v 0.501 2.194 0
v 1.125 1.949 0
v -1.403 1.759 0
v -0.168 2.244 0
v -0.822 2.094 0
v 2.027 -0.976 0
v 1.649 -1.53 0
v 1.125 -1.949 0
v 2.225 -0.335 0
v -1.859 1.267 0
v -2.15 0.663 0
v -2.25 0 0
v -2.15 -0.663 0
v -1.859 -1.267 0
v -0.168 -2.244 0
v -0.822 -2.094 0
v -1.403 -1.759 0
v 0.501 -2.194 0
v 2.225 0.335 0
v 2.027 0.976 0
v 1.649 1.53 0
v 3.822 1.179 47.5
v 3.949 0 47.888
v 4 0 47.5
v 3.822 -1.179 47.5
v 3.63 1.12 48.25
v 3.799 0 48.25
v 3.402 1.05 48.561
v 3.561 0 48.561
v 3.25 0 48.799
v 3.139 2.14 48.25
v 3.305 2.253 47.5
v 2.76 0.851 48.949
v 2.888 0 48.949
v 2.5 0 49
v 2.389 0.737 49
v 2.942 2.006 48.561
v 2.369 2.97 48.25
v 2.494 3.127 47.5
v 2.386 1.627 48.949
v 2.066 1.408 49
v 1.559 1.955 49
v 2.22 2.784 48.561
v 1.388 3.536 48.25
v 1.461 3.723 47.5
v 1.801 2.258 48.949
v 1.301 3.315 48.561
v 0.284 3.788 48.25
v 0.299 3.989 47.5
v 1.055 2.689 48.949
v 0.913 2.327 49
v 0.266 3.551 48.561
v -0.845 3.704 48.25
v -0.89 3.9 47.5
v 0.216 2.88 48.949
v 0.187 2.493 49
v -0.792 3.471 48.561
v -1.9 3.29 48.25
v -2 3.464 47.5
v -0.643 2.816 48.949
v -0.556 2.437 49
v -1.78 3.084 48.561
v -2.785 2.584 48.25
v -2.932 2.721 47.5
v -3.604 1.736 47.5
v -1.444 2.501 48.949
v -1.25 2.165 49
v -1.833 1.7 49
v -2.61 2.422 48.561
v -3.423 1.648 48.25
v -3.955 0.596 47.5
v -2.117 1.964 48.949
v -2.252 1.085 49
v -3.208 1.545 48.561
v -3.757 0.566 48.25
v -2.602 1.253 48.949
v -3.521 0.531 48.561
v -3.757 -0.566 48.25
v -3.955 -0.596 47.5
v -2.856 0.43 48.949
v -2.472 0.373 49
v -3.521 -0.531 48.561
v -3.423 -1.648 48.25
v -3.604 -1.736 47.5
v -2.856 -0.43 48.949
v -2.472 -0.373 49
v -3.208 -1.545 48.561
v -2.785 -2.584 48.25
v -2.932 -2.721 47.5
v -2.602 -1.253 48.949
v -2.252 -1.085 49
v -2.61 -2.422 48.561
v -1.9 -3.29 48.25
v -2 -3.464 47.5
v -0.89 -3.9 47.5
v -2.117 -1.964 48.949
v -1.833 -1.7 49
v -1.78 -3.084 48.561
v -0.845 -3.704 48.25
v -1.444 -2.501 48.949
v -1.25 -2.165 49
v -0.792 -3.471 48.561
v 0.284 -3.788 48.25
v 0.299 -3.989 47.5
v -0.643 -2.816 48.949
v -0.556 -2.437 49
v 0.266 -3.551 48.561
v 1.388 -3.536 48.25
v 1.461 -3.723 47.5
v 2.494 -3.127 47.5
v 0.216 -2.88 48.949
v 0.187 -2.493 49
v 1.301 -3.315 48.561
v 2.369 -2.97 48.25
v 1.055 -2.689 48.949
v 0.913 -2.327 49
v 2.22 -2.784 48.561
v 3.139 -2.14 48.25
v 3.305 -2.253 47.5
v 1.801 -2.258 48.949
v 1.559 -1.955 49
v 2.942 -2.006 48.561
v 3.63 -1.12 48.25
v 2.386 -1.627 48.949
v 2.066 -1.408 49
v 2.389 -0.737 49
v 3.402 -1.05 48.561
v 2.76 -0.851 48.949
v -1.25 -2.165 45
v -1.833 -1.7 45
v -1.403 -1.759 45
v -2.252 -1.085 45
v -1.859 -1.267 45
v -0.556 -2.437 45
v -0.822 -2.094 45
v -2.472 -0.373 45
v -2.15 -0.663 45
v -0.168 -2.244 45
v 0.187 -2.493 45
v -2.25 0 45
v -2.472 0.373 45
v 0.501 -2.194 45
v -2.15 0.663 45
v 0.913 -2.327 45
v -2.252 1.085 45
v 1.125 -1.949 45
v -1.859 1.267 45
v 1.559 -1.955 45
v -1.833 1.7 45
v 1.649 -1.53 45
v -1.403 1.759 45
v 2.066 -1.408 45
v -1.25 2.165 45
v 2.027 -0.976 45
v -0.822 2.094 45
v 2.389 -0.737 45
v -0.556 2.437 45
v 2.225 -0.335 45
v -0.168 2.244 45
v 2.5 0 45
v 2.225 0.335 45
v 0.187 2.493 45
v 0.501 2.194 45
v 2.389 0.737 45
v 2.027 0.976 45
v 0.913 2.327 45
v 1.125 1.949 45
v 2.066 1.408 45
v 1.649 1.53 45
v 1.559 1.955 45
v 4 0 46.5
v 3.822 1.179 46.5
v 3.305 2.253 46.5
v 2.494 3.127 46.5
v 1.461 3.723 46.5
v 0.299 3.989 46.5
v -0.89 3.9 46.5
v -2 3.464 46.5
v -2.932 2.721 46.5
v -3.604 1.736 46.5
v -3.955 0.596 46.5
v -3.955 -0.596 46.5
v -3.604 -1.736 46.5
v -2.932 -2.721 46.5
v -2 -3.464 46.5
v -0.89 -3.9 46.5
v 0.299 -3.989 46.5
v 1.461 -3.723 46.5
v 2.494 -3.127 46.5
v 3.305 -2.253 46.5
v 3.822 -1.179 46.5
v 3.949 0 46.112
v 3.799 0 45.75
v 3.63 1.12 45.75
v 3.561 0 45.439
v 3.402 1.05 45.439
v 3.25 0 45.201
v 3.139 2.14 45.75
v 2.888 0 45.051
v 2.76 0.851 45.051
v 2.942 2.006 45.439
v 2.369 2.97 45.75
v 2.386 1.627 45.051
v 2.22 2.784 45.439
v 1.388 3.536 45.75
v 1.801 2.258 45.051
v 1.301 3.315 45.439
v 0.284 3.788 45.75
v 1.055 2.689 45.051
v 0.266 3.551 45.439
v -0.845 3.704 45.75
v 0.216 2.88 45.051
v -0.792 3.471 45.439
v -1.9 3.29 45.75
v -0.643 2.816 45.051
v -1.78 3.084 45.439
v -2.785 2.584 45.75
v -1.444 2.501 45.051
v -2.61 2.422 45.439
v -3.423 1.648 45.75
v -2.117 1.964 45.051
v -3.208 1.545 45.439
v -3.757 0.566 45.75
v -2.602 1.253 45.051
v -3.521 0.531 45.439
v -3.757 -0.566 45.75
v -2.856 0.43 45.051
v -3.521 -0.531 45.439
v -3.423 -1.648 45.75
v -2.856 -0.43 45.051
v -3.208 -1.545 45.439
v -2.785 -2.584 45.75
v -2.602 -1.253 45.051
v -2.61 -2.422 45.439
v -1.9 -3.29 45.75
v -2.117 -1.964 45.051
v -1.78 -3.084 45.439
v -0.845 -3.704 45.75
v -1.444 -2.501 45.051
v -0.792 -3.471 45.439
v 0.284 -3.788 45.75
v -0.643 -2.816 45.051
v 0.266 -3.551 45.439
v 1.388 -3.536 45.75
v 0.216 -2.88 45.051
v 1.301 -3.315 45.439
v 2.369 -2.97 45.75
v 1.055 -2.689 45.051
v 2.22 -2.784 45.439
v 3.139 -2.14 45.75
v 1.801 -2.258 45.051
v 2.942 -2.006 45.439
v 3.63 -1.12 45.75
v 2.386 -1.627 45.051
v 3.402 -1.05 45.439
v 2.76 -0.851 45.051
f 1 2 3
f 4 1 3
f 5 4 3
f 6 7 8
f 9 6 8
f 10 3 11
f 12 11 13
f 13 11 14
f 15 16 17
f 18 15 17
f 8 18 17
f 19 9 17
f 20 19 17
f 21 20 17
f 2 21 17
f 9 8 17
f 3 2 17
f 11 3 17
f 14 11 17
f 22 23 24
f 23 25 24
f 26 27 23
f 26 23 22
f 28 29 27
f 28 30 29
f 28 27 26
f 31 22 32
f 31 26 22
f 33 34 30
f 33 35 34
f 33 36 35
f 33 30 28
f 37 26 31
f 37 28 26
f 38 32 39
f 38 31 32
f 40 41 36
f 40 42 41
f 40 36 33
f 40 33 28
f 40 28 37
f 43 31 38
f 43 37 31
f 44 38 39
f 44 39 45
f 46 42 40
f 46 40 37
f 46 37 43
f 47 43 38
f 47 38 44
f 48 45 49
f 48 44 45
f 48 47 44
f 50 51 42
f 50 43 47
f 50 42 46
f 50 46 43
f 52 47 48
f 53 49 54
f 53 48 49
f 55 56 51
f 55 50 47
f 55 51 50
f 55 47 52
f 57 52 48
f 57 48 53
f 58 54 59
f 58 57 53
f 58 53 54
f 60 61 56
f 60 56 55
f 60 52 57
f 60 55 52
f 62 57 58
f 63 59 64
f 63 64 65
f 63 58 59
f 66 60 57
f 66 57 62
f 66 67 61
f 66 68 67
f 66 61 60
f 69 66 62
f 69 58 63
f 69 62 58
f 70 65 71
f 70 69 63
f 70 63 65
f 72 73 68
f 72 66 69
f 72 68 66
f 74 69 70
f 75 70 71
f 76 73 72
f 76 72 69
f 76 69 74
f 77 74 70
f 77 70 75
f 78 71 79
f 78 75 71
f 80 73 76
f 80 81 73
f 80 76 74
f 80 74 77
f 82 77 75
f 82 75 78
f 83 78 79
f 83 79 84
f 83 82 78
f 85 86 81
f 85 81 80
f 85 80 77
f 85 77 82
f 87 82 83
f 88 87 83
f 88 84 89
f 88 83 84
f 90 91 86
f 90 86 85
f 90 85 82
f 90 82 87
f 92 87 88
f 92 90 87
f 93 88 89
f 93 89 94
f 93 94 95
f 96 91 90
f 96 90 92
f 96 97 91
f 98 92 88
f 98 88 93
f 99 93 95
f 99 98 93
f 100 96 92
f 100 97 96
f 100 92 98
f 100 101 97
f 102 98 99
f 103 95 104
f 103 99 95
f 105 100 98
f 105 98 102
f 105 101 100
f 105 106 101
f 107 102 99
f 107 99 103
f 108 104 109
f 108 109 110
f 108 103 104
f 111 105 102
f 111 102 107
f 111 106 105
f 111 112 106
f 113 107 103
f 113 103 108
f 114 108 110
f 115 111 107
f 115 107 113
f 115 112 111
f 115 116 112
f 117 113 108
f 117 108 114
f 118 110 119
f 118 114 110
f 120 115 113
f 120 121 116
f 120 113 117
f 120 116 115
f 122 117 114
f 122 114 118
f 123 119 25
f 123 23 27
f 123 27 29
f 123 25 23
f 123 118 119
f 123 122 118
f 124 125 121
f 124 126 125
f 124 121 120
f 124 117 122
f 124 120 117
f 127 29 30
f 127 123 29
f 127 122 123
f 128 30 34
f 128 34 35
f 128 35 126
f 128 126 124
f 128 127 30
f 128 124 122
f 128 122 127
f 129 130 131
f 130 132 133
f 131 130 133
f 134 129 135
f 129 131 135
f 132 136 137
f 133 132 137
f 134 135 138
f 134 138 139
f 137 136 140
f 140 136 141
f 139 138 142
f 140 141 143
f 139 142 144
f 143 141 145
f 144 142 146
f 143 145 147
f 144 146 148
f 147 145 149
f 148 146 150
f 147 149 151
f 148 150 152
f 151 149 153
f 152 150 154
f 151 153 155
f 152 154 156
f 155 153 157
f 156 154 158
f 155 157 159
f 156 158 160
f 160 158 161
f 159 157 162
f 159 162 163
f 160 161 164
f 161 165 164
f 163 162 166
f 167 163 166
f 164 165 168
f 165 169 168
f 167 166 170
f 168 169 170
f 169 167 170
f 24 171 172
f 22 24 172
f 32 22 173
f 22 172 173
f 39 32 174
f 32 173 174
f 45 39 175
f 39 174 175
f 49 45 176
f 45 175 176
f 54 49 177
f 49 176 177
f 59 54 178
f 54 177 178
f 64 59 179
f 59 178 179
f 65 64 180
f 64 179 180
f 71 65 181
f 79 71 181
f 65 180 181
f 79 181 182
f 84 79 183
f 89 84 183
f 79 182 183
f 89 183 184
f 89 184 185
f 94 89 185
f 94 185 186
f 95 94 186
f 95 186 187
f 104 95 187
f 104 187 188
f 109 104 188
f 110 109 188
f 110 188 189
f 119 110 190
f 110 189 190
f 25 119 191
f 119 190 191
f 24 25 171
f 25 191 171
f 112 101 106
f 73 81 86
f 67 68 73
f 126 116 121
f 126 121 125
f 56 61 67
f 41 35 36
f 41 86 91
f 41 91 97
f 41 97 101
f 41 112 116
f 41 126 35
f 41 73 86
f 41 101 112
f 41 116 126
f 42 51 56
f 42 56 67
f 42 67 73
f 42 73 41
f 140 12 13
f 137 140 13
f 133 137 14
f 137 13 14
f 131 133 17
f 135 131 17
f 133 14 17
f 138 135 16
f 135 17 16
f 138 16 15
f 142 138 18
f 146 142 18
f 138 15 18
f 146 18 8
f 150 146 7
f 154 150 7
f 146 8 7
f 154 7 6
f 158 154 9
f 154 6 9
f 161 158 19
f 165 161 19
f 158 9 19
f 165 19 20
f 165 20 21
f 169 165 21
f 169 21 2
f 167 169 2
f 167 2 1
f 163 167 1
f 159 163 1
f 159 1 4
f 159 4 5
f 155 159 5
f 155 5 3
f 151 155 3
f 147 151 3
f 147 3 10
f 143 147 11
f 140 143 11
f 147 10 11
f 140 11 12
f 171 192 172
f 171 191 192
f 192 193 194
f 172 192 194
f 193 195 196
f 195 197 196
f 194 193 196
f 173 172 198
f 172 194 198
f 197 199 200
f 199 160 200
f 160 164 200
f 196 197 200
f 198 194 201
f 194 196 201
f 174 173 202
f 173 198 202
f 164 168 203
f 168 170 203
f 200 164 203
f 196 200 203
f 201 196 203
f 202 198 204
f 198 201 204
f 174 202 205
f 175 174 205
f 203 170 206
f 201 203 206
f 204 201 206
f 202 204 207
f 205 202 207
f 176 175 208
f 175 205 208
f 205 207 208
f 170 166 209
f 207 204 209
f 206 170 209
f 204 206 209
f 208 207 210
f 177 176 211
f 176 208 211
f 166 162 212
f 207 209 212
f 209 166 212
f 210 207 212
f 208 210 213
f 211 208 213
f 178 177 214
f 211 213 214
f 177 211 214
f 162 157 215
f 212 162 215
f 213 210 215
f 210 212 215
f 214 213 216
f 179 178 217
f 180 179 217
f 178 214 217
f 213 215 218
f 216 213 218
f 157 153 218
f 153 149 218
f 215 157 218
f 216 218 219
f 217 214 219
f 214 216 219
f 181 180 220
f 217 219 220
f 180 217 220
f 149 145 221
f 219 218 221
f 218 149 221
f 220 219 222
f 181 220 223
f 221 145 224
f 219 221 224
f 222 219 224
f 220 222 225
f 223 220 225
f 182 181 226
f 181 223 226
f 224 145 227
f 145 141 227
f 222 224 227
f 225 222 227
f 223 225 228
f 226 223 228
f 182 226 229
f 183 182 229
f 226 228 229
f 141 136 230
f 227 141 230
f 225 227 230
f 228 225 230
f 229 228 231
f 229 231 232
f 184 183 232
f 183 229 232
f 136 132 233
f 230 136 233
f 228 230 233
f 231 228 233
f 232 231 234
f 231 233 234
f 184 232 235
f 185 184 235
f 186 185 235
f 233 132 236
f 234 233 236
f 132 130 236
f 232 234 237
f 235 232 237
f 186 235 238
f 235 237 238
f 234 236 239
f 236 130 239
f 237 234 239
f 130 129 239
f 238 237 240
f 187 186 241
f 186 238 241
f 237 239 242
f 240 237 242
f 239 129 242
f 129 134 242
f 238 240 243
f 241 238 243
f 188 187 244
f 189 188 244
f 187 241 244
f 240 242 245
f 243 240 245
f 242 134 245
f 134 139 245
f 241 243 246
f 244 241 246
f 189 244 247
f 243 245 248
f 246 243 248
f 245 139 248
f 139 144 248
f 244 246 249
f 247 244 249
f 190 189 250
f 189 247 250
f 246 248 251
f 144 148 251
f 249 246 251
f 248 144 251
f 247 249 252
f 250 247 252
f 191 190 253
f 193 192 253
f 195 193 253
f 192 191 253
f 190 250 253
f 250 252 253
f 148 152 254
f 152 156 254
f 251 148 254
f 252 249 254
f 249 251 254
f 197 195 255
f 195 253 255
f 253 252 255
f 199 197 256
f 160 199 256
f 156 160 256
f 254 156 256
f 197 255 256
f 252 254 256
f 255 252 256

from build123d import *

# Parameters (mm, degrees)
SKETCH1_R           = 2.25
BOSS_EXTRUDE1_DEPTH = 45
SKETCH2_R           = 4
BOSS_EXTRUDE2_DEPTH = 4
FILLET1_R           = 1.5


with BuildPart() as part:
    # Sketch1 → Boss-Extrude1 (new body)
    with BuildSketch(Plane.XY):
        with Locations(Location((0, 0, 0), (0, 0, 180))):
            Circle(SKETCH1_R)
    extrude(amount=BOSS_EXTRUDE1_DEPTH)

    # Sketch2 → Boss-Extrude2 (add)
    with BuildSketch(Plane.XY.offset(45)):
        Circle(SKETCH2_R)
    extrude(amount=BOSS_EXTRUDE2_DEPTH)

    # Fillet1
    fillet1_edges = [part.edges().sort_by_distance(p)[0] for p in [
        (-4, 0, 45),
        (-4, 0, 49),
    ]]
    fillet(fillet1_edges, radius=FILLET1_R)


solid = part.part
